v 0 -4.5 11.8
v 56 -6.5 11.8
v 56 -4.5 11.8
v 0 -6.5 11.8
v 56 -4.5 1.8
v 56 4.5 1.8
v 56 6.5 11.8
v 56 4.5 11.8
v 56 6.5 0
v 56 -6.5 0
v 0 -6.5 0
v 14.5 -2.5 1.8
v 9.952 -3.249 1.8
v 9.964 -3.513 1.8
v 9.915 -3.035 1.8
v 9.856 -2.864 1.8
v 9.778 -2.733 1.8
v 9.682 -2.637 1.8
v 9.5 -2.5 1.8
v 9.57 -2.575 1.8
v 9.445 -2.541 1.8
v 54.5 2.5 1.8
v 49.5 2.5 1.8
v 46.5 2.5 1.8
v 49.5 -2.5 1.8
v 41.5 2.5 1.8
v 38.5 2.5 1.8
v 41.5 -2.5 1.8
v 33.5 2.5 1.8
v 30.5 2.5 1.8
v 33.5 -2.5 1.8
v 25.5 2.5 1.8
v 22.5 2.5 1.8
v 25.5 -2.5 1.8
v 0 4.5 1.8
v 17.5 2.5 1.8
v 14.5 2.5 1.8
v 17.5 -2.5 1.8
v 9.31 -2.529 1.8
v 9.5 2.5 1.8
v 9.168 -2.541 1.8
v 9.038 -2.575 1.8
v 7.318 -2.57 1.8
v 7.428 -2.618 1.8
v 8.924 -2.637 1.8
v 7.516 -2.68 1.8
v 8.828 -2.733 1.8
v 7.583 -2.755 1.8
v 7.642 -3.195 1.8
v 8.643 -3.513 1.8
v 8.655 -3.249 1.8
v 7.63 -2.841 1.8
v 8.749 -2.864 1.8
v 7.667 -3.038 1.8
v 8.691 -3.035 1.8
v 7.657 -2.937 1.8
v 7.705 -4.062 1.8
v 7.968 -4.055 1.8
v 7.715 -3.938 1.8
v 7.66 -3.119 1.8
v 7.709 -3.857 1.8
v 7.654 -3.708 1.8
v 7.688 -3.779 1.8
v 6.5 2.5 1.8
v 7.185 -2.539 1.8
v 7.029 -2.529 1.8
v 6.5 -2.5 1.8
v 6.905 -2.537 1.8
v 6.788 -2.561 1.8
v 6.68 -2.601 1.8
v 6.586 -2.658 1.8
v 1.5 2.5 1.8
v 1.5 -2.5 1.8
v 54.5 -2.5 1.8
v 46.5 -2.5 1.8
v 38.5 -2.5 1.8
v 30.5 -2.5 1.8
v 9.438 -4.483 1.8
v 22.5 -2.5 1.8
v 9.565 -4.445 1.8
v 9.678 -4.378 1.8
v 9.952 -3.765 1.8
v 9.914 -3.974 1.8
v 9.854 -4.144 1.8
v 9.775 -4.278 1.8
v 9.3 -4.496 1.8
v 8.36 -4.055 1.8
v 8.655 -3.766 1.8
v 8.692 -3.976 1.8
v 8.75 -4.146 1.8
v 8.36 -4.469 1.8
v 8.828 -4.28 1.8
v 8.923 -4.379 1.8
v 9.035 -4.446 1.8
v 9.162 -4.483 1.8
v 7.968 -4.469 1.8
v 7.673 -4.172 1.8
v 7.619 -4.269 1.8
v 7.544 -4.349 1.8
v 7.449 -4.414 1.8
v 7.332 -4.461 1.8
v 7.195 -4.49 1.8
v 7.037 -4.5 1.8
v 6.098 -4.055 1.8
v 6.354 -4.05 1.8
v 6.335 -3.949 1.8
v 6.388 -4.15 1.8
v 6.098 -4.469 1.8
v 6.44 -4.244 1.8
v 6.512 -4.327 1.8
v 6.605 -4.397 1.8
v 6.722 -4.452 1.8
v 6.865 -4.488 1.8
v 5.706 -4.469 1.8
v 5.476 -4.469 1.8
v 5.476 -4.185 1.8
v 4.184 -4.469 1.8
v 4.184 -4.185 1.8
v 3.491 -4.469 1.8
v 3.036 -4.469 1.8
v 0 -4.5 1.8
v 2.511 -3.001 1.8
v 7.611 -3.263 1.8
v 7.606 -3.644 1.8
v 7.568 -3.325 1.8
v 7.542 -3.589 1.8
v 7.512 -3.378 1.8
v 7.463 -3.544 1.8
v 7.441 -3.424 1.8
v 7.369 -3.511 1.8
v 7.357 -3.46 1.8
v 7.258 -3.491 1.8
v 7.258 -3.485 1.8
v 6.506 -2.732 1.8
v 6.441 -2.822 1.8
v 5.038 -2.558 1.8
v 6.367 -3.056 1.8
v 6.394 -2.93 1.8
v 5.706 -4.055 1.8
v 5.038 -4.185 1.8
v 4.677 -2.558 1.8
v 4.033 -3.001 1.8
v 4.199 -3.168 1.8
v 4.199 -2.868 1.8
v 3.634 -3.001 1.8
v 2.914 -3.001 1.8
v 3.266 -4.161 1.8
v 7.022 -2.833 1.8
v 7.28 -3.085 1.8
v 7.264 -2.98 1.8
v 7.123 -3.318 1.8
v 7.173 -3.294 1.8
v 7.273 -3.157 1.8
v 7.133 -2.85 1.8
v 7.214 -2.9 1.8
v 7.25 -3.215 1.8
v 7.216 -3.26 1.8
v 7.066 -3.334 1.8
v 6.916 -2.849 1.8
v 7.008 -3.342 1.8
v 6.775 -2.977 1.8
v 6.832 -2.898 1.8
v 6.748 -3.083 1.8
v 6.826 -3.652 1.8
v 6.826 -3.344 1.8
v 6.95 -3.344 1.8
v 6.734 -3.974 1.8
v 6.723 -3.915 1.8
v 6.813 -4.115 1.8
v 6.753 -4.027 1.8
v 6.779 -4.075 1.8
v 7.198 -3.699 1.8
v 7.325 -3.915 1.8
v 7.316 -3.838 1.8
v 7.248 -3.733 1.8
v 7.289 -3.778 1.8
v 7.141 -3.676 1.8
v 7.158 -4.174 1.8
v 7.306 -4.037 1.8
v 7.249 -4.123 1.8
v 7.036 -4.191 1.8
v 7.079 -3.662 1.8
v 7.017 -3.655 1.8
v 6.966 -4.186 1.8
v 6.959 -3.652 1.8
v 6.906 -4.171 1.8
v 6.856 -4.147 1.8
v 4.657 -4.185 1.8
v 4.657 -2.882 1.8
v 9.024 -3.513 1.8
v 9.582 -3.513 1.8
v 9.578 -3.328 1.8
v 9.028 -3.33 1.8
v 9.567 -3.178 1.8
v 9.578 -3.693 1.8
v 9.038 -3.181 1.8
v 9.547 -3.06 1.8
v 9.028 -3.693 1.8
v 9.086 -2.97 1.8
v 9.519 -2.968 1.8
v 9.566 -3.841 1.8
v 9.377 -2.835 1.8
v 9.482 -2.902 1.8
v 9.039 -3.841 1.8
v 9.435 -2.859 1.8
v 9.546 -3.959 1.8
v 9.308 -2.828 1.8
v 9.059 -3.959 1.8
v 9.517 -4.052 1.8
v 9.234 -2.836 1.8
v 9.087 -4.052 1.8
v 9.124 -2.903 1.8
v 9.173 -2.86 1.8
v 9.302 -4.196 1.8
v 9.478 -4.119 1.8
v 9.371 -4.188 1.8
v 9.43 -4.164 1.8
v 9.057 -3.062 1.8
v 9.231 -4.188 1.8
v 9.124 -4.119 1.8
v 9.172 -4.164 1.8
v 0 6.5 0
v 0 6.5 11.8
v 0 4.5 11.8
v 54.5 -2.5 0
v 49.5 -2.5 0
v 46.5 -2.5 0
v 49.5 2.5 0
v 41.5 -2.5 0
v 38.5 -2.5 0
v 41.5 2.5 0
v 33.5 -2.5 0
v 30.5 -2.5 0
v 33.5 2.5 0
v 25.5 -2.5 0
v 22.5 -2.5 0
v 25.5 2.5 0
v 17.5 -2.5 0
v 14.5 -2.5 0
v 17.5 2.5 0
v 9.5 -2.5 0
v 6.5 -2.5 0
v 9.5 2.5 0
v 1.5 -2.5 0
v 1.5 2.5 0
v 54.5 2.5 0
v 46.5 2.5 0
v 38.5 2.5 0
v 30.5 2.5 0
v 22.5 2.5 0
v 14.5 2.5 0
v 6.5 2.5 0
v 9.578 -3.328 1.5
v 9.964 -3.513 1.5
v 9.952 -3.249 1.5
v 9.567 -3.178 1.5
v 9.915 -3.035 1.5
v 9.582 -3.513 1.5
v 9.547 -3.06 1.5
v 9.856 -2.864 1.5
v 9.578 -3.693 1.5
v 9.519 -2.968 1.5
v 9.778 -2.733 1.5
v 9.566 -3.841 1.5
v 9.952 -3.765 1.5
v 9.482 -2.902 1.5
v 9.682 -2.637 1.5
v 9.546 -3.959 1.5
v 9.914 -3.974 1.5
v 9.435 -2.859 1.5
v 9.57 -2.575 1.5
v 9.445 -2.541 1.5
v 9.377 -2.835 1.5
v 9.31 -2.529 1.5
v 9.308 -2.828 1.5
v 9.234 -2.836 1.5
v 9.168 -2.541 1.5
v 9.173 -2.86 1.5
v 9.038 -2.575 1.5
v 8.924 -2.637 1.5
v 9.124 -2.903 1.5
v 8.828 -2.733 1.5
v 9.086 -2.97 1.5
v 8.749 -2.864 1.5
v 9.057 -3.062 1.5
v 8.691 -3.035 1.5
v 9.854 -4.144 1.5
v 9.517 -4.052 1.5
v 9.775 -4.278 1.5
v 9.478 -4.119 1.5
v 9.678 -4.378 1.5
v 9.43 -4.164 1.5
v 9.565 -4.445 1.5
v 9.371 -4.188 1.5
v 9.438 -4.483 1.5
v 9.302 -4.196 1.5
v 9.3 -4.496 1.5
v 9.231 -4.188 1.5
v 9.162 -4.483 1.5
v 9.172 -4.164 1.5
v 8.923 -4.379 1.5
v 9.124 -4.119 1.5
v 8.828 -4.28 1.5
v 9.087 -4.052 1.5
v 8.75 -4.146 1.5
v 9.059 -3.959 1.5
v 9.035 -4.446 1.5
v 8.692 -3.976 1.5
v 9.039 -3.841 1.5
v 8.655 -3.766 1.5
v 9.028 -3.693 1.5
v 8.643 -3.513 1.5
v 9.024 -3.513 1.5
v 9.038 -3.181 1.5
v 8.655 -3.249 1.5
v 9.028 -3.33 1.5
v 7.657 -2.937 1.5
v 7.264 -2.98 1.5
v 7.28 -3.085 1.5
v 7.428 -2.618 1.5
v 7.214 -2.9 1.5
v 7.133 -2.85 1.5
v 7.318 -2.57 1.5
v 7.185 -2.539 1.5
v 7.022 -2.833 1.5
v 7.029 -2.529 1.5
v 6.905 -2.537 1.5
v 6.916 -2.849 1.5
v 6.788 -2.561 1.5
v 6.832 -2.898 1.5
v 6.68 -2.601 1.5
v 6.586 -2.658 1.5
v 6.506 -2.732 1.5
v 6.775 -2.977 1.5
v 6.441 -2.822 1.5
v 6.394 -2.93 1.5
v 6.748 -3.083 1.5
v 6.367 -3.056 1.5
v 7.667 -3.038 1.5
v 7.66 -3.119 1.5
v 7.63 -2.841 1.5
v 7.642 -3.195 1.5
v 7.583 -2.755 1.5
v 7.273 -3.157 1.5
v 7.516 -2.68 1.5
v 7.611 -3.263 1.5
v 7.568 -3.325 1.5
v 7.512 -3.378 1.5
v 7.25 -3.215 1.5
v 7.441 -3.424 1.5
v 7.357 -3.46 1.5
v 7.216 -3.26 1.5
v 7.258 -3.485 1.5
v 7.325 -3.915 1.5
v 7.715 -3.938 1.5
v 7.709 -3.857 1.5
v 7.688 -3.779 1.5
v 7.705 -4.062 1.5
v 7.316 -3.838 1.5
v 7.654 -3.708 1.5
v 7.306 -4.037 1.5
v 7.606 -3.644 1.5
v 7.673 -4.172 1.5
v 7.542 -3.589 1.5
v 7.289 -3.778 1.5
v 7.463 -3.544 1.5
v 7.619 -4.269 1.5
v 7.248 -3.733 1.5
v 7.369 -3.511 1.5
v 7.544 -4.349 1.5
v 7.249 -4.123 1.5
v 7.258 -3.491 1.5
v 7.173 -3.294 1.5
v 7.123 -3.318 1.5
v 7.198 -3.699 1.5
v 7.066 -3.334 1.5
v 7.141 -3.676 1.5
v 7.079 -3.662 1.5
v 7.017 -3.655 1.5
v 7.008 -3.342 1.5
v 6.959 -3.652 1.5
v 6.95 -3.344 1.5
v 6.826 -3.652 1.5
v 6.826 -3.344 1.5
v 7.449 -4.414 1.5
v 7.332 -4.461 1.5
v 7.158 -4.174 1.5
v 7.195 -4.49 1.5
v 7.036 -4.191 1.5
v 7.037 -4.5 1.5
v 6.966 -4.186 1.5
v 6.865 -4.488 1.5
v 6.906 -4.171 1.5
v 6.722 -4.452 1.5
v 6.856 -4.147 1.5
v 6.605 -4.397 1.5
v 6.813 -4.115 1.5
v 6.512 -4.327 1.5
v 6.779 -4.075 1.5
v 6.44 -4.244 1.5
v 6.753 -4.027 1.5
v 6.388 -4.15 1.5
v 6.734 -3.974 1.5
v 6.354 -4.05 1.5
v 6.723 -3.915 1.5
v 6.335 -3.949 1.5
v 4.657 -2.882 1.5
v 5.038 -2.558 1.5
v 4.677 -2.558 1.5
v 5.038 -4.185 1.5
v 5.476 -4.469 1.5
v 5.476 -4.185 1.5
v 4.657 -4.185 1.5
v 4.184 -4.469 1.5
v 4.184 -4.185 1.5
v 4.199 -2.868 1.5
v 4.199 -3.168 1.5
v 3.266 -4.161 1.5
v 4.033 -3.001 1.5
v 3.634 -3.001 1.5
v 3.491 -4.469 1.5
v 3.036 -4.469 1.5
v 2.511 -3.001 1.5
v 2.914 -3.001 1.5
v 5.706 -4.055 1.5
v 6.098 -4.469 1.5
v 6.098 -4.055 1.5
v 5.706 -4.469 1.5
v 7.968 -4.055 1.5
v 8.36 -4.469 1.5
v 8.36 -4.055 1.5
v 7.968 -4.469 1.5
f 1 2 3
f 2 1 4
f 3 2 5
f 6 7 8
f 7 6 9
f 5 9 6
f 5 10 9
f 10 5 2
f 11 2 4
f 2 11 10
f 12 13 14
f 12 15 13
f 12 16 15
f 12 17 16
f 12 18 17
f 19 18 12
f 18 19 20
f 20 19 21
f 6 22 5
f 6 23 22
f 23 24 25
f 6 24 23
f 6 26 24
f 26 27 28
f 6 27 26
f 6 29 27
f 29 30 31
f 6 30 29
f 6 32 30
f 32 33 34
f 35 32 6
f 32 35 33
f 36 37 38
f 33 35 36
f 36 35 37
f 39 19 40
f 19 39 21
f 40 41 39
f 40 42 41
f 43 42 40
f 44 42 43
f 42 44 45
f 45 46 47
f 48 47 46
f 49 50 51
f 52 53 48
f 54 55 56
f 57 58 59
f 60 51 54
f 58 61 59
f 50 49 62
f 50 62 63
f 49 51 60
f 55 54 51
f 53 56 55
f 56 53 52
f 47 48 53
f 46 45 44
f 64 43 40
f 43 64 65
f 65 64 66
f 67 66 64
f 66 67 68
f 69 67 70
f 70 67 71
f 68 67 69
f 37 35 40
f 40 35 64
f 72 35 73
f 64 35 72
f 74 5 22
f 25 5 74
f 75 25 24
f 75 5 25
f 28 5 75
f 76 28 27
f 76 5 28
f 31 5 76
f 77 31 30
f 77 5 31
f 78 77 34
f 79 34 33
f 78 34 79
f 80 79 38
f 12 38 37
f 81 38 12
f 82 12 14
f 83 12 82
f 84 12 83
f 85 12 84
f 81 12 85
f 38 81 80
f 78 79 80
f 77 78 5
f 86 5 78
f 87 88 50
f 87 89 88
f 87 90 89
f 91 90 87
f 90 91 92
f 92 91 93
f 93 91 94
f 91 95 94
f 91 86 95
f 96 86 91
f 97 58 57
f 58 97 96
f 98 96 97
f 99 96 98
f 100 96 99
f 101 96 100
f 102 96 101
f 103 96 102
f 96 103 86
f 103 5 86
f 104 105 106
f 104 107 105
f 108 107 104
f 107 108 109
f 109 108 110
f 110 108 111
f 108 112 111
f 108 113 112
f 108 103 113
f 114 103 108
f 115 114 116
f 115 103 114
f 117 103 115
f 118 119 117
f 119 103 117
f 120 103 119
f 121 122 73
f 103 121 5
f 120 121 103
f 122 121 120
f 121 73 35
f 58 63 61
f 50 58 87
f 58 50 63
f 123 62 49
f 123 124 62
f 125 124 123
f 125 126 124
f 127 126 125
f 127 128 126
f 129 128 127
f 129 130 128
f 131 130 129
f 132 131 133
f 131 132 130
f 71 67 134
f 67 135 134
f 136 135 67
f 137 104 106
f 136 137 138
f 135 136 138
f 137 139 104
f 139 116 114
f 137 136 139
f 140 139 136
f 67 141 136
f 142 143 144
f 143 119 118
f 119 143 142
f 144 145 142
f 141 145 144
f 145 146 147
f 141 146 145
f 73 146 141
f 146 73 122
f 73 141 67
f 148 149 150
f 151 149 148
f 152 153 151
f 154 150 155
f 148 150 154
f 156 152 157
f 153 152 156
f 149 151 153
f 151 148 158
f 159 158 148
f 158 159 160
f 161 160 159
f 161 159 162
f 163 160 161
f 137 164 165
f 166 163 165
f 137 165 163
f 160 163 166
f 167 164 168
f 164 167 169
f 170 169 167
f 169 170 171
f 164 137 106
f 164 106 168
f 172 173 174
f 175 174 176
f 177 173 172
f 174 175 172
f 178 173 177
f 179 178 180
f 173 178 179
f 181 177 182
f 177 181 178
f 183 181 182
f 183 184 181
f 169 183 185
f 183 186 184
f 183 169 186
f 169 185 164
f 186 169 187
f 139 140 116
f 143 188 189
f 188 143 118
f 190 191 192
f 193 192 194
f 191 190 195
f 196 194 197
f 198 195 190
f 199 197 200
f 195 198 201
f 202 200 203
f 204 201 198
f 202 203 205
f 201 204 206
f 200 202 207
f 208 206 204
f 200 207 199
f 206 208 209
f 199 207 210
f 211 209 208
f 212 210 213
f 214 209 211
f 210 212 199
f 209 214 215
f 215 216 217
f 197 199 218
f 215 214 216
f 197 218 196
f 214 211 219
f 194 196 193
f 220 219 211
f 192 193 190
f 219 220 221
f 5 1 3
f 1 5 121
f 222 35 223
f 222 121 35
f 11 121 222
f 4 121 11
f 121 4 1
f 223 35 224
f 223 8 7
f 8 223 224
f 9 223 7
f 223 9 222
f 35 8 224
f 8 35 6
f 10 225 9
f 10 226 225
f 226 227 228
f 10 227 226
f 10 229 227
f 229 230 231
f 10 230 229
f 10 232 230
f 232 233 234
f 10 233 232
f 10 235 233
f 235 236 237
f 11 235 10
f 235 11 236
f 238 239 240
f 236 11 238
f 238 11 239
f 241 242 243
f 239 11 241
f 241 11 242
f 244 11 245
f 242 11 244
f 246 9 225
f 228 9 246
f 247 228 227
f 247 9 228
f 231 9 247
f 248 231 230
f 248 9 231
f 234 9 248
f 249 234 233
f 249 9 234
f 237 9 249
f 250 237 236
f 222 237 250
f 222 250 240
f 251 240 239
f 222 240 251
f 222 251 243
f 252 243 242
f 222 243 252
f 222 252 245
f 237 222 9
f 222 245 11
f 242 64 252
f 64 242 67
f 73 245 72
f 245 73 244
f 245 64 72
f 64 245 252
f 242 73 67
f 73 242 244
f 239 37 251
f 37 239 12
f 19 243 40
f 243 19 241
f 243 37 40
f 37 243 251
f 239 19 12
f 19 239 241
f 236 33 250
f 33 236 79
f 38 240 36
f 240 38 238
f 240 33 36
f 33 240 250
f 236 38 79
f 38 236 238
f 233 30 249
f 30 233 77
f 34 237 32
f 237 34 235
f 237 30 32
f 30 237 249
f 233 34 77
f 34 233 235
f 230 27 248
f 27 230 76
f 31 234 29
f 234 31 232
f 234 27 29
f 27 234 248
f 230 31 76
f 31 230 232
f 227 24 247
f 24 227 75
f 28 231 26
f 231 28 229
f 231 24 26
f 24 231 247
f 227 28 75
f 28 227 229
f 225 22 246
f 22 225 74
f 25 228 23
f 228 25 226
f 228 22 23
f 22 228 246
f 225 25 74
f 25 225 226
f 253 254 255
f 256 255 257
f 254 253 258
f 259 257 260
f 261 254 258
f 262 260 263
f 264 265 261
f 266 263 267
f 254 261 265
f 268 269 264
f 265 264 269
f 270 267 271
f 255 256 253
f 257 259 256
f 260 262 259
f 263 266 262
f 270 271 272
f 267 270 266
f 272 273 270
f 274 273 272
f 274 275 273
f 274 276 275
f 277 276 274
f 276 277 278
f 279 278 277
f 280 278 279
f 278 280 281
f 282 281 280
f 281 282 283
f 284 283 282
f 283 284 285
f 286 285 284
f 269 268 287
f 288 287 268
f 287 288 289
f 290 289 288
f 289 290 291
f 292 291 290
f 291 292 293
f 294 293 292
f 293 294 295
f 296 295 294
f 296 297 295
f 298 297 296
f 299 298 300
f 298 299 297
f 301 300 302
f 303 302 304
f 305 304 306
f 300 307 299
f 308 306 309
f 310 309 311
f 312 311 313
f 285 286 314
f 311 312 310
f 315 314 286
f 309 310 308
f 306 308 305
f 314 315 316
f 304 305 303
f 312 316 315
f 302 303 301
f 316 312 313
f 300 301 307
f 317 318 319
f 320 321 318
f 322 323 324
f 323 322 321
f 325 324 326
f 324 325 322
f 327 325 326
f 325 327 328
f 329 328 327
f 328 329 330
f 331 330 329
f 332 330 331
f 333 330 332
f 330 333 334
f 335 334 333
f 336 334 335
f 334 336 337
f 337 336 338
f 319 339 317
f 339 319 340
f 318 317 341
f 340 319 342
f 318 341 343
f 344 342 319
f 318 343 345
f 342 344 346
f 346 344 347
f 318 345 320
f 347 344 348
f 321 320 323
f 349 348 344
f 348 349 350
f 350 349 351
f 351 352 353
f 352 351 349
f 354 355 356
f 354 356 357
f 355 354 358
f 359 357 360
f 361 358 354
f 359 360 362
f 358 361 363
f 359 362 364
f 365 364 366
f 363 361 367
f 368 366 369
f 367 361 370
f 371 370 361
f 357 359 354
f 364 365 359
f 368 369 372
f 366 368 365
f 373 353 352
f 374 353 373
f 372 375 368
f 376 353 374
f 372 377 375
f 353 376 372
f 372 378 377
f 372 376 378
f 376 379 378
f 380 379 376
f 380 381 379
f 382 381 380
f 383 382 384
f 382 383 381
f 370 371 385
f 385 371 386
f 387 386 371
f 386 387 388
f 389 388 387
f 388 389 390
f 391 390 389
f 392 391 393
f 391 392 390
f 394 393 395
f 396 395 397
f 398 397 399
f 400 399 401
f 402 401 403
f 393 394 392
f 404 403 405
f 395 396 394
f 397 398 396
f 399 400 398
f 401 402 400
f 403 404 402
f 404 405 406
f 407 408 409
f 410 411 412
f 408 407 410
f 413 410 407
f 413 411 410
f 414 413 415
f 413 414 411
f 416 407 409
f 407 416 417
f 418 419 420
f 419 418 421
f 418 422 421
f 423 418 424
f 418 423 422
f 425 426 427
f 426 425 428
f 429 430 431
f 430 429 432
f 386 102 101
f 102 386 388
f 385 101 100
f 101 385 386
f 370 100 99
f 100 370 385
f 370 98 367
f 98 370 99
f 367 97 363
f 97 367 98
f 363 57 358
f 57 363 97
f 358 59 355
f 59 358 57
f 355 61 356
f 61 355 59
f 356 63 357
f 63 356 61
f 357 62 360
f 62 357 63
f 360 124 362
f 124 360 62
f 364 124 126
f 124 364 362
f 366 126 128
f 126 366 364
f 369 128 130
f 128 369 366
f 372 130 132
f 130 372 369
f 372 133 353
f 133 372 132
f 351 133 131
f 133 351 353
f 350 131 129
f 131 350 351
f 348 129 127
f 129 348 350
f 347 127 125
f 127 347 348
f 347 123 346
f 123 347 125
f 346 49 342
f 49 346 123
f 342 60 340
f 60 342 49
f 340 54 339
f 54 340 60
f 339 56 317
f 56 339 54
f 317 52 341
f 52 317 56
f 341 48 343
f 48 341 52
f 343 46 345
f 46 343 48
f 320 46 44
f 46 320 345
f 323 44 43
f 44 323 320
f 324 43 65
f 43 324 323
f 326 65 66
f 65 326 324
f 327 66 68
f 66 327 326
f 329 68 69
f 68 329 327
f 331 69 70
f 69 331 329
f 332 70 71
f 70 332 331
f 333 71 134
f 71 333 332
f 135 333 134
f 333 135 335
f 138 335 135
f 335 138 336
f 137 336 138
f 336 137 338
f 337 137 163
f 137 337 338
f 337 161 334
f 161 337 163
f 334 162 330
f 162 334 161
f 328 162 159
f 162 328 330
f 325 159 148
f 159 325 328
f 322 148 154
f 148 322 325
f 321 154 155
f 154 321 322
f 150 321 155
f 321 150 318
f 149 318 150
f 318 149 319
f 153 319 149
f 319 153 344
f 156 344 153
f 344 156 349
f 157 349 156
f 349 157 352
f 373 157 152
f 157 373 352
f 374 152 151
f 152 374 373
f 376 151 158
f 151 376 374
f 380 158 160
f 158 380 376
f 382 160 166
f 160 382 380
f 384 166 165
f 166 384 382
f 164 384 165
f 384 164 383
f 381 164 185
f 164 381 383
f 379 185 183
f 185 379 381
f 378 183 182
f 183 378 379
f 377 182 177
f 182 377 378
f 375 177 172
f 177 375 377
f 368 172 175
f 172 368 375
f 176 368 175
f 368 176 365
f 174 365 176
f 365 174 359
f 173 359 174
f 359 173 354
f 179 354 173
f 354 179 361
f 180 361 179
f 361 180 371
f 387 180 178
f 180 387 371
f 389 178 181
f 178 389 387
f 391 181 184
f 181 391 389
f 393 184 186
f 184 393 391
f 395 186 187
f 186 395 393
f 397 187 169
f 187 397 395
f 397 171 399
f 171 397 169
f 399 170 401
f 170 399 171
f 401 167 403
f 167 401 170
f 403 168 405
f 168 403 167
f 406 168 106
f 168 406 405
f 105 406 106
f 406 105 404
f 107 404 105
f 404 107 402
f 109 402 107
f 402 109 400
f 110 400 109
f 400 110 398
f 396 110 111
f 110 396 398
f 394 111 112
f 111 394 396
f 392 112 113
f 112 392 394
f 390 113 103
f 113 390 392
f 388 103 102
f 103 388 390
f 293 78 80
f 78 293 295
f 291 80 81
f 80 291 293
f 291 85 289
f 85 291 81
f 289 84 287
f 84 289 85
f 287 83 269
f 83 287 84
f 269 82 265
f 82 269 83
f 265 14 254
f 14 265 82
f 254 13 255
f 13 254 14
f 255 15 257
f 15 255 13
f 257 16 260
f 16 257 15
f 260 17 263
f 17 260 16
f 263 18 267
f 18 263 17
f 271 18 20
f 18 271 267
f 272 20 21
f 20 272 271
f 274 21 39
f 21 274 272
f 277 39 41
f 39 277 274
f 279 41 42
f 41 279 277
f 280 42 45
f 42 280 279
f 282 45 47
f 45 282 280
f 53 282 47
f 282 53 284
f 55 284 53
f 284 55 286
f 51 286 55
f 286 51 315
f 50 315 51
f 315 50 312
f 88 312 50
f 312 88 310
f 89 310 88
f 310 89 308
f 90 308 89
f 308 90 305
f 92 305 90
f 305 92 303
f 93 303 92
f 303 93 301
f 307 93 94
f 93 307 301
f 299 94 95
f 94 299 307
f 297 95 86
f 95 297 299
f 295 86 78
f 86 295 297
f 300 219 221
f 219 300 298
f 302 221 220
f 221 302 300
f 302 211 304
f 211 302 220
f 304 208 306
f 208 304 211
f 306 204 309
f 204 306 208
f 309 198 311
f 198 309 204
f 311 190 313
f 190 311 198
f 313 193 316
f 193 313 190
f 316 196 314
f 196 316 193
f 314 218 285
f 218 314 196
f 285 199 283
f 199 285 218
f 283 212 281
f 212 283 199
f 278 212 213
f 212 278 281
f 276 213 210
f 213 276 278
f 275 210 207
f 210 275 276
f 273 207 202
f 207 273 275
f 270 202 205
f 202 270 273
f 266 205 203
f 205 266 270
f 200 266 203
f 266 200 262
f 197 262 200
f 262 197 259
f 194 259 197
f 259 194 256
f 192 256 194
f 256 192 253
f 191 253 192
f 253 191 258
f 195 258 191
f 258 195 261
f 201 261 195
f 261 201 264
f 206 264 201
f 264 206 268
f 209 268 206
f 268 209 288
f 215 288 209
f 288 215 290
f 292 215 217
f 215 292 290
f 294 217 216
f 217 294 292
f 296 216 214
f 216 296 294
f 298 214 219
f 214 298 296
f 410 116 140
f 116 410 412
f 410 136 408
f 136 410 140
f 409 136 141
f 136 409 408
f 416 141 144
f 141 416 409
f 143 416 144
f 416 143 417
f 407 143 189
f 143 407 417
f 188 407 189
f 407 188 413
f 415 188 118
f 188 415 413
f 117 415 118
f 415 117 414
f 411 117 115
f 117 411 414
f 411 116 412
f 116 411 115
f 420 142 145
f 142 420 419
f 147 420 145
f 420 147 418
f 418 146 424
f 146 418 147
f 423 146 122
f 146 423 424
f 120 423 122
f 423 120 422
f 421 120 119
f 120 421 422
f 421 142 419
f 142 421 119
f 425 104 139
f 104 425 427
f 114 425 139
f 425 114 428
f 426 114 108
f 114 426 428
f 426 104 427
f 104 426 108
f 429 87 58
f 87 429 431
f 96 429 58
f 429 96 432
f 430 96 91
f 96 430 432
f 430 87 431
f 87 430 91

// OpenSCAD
// file: common.scad
CENTER_SIZE = 9;
SLEEVE_LENGTH = 55;
SLEEVE_REACH = SLEEVE_LENGTH + CENTER_SIZE/2;
GROOVE_WIDTH = 9;
WALL_HEIGHT = 10;
WALL_THICKNESS = 2;
BASE_THICKNESS = 2;
TOTAL_WIDTH = GROOVE_WIDTH + 2 * WALL_THICKNESS;
DOWEL_DIAMETER = 4.5;
DOWEL_DEPTH = 3.5;
CARDBOARD_THICKNESS = 2;
GROOVE_BOTTOM = CARDBOARD_THICKNESS;
CURVE_POWER = 2;
CURVE_POINTS = 20;
TILT_ANGLE_EXTRA = 5;
FLEXIBLE_WALL_HEIGHT = WALL_HEIGHT * 2;

LEFT = 3;
RIGHT = 1;

function wall_curve(z, wall_height) =
    GROOVE_BOTTOM/2 + (GROOVE_WIDTH/2 - GROOVE_BOTTOM/2) * pow(z/wall_height, CURVE_POWER);

module curved_wall_profile(side, wall_height) {
    points_inner = [for (i = [0:CURVE_POINTS])
        [wall_curve(i * wall_height / CURVE_POINTS, wall_height) * side,
         i * wall_height / CURVE_POINTS]
    ];
    points_outer = [for (i = [0:CURVE_POINTS])
        [(wall_curve(i * wall_height / CURVE_POINTS, wall_height) + WALL_THICKNESS) * side,
         i * wall_height / CURVE_POINTS]
    ];
    all_points = concat(
        [[points_inner[0][0], 0]],
        points_inner,
        [points_outer[len(points_outer)-1]],
        [for (i = [len(points_outer)-1:-1:0]) points_outer[i]],
        [[points_outer[0][0], 0]]
    );
    polygon(all_points);
}

module draw_regular_wall_base(width, z_offset = BASE_THICKNESS) {
    translate([0, 0, z_offset])
        cube([width, WALL_THICKNESS, WALL_HEIGHT]);
}

module draw_flexible_wall_base(width, z_offset = BASE_THICKNESS) {
    wall_height = FLEXIBLE_WALL_HEIGHT - z_offset;
    tilt_angle = atan((GROOVE_WIDTH/2 - GROOVE_BOTTOM/2) / wall_height) + TILT_ANGLE_EXTRA;
    translate([0, -WALL_THICKNESS/2, z_offset - 2])
        rotate([tilt_angle + 6, 0, 0])
            rotate([90, 0, 90])
                linear_extrude(height = width)
                    curved_wall_profile(1, wall_height);
}

module orient_wall(side) {
    if (side == 0) {
        rotate([0, 0, 270])
            children();
    } else if (side == 1) {
        children();
    } else if (side == 2) {
        rotate([0, 0, 90])
            children();
    } else if (side == 3) {
        rotate([0, 0, 180])
            children();
    }
}

module translate_center_wall(side, center_size, base_width) {
    if (side == 0) {
        translate([center_size/2, base_width/2, 0])
            children();
    } else if (side == 1) {
        translate([-base_width/2, center_size/2, 0])
            children();
    } else if (side == 2) {
        translate([-center_size/2, -base_width/2, 0])
            children();
    } else if (side == 3) {
        translate([base_width/2, -center_size/2, 0])
            children();
    }
}

module place_sleeve_dowels(length, base_width = CENTER_SIZE) {
    offset = base_width / 2;
    first_pos = 25 - offset;

    for (i = [0:10]) {
        pos = first_pos + i * 25;
        if (pos + DOWEL_DIAMETER/2 <= length) {
            translate([pos, 0, -DOWEL_DEPTH])
                cylinder(h=DOWEL_DEPTH, d=DOWEL_DIAMETER, $fn=30);
        }
    }
}

module place_center_base(size = TOTAL_WIDTH, height = BASE_THICKNESS) {
    union() {
        translate([-size/2, -size/2, 0])
            cube([size, size, height]);
    }
}

module place_center_wall(side, center_width = TOTAL_WIDTH, z_offset = BASE_THICKNESS, wall_type = "regular") {
    translate_center_wall(side, center_width - 2*WALL_THICKNESS, center_width) {
        orient_wall(side) {
            if (wall_type == "regular") {
                draw_regular_wall_base(center_width, z_offset);
            } else {
                draw_flexible_wall_base(center_width, z_offset);
            }
        }
    }
}

module place_center_dowel(dowel_diameter = DOWEL_DIAMETER, dowel_depth = DOWEL_DEPTH) {
    translate([0, 0, -dowel_depth])
        cylinder(h=dowel_depth, d=dowel_diameter, $fn=30);
}

module place_sleeve_base(length, width, height = BASE_THICKNESS) {
    translate([0, -width/2, 0])
        cube([length, width, height]);
}

module place_sleeve_walls(length, wall_type = "regular", z_offset = BASE_THICKNESS) {
    position_sleeve_wall(LEFT, length) {
        if (wall_type == "regular") {
            draw_regular_wall_base(length, z_offset);
        } else {
            draw_flexible_wall_base(length, z_offset);
        }
    }
    position_sleeve_wall(RIGHT, length) {
        if (wall_type == "regular") {
            draw_regular_wall_base(length, z_offset);
        } else {
            draw_flexible_wall_base(length, z_offset);
        }
    }
}

module orient_sleeve(side, center_size = CENTER_SIZE) {
    if (side == 0) {
        translate([center_size/2, 0, 0])
            children();
    } else if (side == 1) {
        rotate([0, 0, 90])
            translate([center_size/2, 0, 0])
                children();
    } else if (side == 2) {
        rotate([0, 0, 180])
            translate([center_size/2, 0, 0])
                children();
    } else if (side == 3) {
        rotate([0, 0, 270])
            translate([center_size/2, 0, 0])
                children();
    }
}

module translate_sleeve_wall(side, length) {
    if (side == LEFT) {
        translate([length, -TOTAL_WIDTH/2 + WALL_THICKNESS, 0])
            children();
    } else if (side == RIGHT) {
        translate([0, TOTAL_WIDTH/2 - WALL_THICKNESS, 0])
            children();
    }
}

module position_sleeve_wall(side, length) {
    translate_sleeve_wall(side, length) {
        orient_wall(side) {
            children();
        }
    }
}
// file: version.scad
VERSION = "v1.3.0";

module engrave_version_text(text, size=2.0, depth=0.3) {
    linear_extrude(height=depth)
        text(text, size=size, font="Liberation Sans:style=Bold", halign="left", valign="bottom");
}

module print_version_at(x, y, top_z, depth=0.3) {
    translate([x, y, top_z - depth])
        engrave_version_text(VERSION);
}

module print_version(x=-1, y=-4, top_z=2) {
    print_version_at(x, y, top_z);
}

module print_version_sleeve(x=2.5, y=-4.5, top_z=1.8) {
    print_version_at(x, y, top_z);
}
// file: lego.scad
include <common.scad>

LEGO_STUD_DIAMETER = 5.0;
LEGO_STUD_HEIGHT = 1.8;
LEGO_UNIT = 8;
LEGO_HOLE_DIAMETER = 5.0;

LEGO_BASE_WIDTH = 8.0;
LEGO_BASE_CENTER_SIZE = LEGO_UNIT;
LEGO_SLEEVE_STUDS = 7;
LEGO_SLEEVE_LENGTH = LEGO_SLEEVE_STUDS * LEGO_UNIT;
LEGO_TOTAL_WIDTH = LEGO_BASE_WIDTH;

module draw_lego_stud() {
    cylinder(h=LEGO_STUD_HEIGHT, d=LEGO_STUD_DIAMETER, $fn=30);
}

module draw_lego_hole() {
    cylinder(h=LEGO_STUD_HEIGHT + 0.1, d=LEGO_HOLE_DIAMETER, $fn=30);
}

module draw_lego_niche() {
    translate([-LEGO_HOLE_DIAMETER/2, -LEGO_HOLE_DIAMETER/2, 0])
        cube([LEGO_HOLE_DIAMETER, LEGO_HOLE_DIAMETER, LEGO_STUD_HEIGHT+0.1]);
}

module place_center_lego_stud() {
    translate([0, 0, BASE_THICKNESS])
        draw_lego_stud();
}

module place_sleeve_lego_studs(length, base_width = LEGO_BASE_CENTER_SIZE) {
    offset = base_width / 2;
    first_pos = LEGO_UNIT - offset;

    for (i = [0:20]) {
        pos = first_pos + i * LEGO_UNIT;
        if (pos + LEGO_STUD_DIAMETER/2 <= length) {
            translate([pos, 0, BASE_THICKNESS])
                draw_lego_stud();
        }
    }
}

module place_sleeve_lego_holes(length, base_width = LEGO_BASE_CENTER_SIZE) {
    offset = base_width / 2;
    first_pos = LEGO_UNIT - offset;

    for (i = [0:20]) {
        pos = first_pos + i * LEGO_UNIT;
        if (pos + LEGO_HOLE_DIAMETER/2 <= length) {
            translate([pos, 0, -0.05])
                draw_lego_hole();
        }
    }
}

module place_sleeve_lego_niche(length, base_width = LEGO_BASE_CENTER_SIZE) {
    offset = base_width / 2;
    first_pos = LEGO_UNIT - offset;

    for (i = [0:20]) {
        pos = first_pos + i * LEGO_UNIT;
        if (pos + LEGO_HOLE_DIAMETER/2 <= length) {
            translate([pos, 0, -0.05])
                draw_lego_niche();
        }
    }
}
// main file
include <lego.scad>
use <version.scad>

difference() {
    union() {
        place_sleeve_base(LEGO_SLEEVE_LENGTH, TOTAL_WIDTH, LEGO_STUD_HEIGHT);
        place_sleeve_walls(LEGO_SLEEVE_LENGTH, "regular", LEGO_STUD_HEIGHT);
    }

    place_sleeve_lego_niche(LEGO_SLEEVE_LENGTH);
    print_version_sleeve();
}
